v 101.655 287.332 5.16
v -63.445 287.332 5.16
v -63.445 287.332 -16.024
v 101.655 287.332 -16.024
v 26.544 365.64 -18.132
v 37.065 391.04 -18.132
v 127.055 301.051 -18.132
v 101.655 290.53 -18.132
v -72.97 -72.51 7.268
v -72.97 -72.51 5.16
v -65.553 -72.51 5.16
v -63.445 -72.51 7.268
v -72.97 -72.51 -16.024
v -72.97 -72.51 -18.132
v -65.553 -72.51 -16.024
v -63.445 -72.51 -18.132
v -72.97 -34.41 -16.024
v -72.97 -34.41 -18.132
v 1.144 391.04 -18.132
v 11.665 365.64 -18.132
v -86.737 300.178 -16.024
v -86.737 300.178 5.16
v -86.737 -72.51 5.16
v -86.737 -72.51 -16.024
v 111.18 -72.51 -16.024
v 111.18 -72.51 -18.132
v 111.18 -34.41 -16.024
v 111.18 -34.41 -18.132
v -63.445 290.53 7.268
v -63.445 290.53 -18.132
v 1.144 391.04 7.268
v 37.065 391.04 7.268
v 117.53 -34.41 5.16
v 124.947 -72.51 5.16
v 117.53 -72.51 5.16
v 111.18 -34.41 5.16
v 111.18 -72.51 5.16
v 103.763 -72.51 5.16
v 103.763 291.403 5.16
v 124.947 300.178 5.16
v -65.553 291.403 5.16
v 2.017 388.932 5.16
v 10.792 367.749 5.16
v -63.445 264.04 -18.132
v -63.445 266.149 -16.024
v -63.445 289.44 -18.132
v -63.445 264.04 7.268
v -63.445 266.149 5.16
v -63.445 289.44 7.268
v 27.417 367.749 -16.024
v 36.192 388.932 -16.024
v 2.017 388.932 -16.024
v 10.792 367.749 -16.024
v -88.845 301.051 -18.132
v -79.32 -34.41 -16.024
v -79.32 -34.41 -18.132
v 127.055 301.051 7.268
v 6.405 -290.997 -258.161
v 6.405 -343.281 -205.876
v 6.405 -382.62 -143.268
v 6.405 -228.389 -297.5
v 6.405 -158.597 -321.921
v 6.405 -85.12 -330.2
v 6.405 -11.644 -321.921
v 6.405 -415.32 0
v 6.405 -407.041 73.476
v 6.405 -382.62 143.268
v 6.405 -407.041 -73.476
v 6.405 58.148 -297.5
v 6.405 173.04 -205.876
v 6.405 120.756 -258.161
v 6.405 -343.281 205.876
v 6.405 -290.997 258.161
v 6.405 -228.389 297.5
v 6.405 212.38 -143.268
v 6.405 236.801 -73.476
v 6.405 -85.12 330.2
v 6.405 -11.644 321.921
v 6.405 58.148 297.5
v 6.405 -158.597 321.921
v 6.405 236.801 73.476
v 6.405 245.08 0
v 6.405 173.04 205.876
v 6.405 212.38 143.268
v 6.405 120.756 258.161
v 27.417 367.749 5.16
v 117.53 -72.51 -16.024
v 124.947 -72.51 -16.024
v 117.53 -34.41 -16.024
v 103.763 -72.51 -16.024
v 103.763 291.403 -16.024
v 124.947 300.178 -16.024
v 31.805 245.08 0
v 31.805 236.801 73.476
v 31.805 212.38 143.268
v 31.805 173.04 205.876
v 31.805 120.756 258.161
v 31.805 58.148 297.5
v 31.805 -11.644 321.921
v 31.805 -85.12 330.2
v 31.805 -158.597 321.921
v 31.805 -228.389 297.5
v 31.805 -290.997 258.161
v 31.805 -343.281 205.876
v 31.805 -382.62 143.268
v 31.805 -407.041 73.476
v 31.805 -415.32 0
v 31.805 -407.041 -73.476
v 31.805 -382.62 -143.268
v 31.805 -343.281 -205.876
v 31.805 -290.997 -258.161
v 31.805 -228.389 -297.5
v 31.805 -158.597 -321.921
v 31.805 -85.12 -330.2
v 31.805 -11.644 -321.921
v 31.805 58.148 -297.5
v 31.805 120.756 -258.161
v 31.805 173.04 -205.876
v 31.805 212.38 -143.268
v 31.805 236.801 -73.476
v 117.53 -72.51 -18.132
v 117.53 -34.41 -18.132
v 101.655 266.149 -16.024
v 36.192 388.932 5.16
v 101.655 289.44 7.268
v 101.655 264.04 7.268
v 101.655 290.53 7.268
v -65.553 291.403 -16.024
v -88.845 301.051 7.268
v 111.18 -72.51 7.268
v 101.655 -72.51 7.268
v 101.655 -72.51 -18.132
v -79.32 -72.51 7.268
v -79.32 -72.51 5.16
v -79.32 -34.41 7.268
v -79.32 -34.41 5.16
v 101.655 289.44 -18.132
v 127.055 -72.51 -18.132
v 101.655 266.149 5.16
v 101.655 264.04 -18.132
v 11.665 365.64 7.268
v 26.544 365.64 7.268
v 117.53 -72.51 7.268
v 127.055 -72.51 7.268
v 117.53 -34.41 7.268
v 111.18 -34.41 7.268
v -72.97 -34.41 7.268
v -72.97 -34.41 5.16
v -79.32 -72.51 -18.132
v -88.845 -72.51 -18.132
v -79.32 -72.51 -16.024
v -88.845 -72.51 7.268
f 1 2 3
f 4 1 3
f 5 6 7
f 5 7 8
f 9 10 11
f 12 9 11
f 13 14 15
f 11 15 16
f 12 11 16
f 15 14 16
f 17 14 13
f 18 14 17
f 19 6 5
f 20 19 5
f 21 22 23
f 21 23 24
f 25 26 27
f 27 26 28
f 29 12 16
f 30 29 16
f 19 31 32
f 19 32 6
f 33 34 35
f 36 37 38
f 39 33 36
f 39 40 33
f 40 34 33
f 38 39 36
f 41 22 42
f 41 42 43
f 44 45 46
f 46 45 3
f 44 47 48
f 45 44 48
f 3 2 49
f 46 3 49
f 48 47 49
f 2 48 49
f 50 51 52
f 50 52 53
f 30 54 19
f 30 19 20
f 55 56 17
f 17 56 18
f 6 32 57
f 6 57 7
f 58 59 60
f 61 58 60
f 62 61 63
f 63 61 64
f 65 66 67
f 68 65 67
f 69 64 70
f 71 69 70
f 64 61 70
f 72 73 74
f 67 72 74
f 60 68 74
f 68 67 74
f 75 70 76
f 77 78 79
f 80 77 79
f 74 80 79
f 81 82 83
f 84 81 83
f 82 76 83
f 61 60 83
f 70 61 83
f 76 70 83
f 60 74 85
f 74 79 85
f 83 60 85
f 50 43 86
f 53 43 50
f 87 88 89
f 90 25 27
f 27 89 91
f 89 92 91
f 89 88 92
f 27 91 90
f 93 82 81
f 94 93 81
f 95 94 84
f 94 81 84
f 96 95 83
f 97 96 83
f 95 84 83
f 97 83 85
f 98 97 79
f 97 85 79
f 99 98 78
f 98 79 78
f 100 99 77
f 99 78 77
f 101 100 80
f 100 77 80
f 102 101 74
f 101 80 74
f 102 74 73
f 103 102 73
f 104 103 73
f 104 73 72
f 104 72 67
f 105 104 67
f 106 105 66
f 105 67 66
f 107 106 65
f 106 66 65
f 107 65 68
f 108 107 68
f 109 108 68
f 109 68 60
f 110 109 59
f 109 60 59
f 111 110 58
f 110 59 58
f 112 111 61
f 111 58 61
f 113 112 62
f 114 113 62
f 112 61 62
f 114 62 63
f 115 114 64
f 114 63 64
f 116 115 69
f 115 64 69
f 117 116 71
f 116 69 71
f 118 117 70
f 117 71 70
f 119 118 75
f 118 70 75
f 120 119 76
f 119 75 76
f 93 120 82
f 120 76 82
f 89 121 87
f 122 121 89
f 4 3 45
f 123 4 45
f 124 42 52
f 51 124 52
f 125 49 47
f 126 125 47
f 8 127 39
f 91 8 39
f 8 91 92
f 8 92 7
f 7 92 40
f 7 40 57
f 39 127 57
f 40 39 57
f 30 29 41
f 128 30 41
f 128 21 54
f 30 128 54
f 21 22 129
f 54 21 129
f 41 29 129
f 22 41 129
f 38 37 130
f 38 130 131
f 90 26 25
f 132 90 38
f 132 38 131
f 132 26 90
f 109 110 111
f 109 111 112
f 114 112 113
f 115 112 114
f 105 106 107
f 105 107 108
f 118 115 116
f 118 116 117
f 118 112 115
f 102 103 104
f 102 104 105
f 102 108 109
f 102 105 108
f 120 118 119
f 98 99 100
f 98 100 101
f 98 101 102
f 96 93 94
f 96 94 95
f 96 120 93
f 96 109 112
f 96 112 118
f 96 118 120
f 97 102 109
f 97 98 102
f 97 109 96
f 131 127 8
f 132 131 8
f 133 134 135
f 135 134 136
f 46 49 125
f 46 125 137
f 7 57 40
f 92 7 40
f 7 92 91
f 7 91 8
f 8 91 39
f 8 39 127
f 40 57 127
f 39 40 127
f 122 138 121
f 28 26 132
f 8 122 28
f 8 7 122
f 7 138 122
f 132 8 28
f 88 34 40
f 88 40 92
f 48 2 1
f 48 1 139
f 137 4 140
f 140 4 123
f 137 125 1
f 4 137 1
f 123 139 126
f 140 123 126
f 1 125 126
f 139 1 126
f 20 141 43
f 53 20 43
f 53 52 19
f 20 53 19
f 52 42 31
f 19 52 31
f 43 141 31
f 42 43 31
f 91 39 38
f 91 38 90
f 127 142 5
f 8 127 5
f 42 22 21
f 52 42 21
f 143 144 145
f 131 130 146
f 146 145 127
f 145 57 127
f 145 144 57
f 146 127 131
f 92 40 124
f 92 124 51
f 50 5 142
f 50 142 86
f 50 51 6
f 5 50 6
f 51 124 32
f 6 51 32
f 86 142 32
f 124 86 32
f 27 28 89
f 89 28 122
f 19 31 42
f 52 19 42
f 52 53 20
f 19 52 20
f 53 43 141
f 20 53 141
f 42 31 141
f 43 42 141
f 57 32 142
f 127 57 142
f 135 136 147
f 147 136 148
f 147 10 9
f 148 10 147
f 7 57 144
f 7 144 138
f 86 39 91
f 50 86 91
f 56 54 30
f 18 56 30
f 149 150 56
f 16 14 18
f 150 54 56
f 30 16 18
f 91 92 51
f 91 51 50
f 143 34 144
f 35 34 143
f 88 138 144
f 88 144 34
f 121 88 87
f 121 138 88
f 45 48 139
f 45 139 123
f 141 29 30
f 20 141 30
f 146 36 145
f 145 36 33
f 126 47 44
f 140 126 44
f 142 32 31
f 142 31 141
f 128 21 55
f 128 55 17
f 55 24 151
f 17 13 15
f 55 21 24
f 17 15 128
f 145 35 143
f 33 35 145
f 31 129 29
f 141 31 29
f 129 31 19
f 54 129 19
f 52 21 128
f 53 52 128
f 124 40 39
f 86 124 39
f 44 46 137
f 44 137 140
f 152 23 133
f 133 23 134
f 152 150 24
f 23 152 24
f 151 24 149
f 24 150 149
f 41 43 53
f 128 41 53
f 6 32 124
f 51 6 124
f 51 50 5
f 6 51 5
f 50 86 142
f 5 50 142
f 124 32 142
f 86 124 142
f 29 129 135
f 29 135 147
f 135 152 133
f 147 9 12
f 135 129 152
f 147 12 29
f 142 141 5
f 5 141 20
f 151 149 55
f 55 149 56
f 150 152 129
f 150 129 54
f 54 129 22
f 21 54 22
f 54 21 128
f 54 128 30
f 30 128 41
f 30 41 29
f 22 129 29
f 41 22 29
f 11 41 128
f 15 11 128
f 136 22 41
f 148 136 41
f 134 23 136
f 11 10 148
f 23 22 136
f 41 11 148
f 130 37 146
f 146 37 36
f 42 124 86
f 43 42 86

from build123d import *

# Parameters (mm, degrees)
WHEEL_START                                    = 6.404710745
WHEEL_OUTLINE_R                                = 330.2
WHEEL_DEPTH                                    = 25.4
SKETCH11_W                                     = 25.4
SKETCH11_H                                     = 25.4
SKETCH11_W_2                                   = 21.1836
SKETCH11_H_2                                   = 21.1836
AL_TUBE_SQUARE_AL_TUBE_1_SQR_X_0_083_WAL_DEPTH = 376.739487758
SKETCH11_ON_SEGMENT_2_W                        = 25.4
SKETCH11_ON_SEGMENT_2_H                        = 25.4
SKETCH11_ON_SEGMENT_2_W_2                      = 21.1836
SKETCH11_ON_SEGMENT_2_H_2                      = 21.1836
AL_TUBE_SQUARE_AL_TUBE_1_SQR_X_0_083_3_DEPTH   = 133.622305091
SKETCH11_ON_SEGMENT_3_W                        = 25.4
SKETCH11_ON_SEGMENT_3_H                        = 25.4
SKETCH11_ON_SEGMENT_3_W_2                      = 21.1836
SKETCH11_ON_SEGMENT_3_H_2                      = 21.1836
AL_TUBE_SQUARE_AL_TUBE_1_SQR_X_0_083_5_DEPTH   = 42.278975516
SKETCH11_ON_SEGMENT_4_W                        = 25.4
SKETCH11_ON_SEGMENT_4_H                        = 25.4
SKETCH11_ON_SEGMENT_4_W_2                      = 21.1836
SKETCH11_ON_SEGMENT_4_H_2                      = 21.1836
AL_TUBE_SQUARE_AL_TUBE_1_SQR_X_0_083_7_DEPTH   = 133.622305091
SKETCH11_ON_SEGMENT_5_W                        = 25.4
SKETCH11_ON_SEGMENT_5_H                        = 25.4
SKETCH11_ON_SEGMENT_5_W_2                      = 21.1836
SKETCH11_ON_SEGMENT_5_H_2                      = 21.1836
AL_TUBE_SQUARE_AL_TUBE_1_SQR_X_0_083_9_DEPTH   = 376.739487758
SKETCH11_ON_SEGMENT_6_W                        = 25.4
SKETCH11_ON_SEGMENT_6_H                        = 25.4
SKETCH11_ON_SEGMENT_6_W_2                      = 21.1836
SKETCH11_ON_SEGMENT_6_H_2                      = 21.1836
AL_TUBE_SQUARE_AL_TUBE_1_SQR_X_0_083_10_DEPTH  = 192.500000002
CUT_EXTRUDE1_DEPTH                             = 551.016675996
CUT_EXTRUDE1_DEPTH_BACK                        = 551.016675996
SKETCH16_W                                     = 6.35
SKETCH16_H                                     = 38.1


# Read off the part's stored shape, not the designer's step: wheel
with BuildPart() as part:
    # wheel outline → wheel (new body)
    with BuildSketch(Plane.YZ.offset(WHEEL_START)):
        with Locations((-85.120268568, 0)):
            Circle(WHEEL_OUTLINE_R)
    extrude(amount=WHEEL_DEPTH)


with BuildPart() as body_2:
    # Sketch11 → Al tube square AL TUBE 1 SQR X 0.083 WALL(1) (new body)
    with BuildSketch(Plane(origin=(-76.145289254, -72.509659064, -5.432195809), x_dir=(1, 0, 0), z_dir=(0, 1, 0))):
        Rectangle(SKETCH11_W, SKETCH11_H)
        Rectangle(SKETCH11_W_2, SKETCH11_H_2, mode=Mode.SUBTRACT)
    extrude(amount=AL_TUBE_SQUARE_AL_TUBE_1_SQR_X_0_083_WAL_DEPTH)

    # Al tube square AL TUBE 1 SQR X 0.083 2
    split(bisect_by=Plane(origin=(-76.145289254, 295.790340936, -5.432195809), x_dir=(0.923879533, -0.382683432, 0), z_dir=(-0.382683432, -0.923879533, 0)), keep=Keep.TOP)


with BuildPart() as body_3:
    # Sketch11 on segment 2 (carried to segment 2) → Al tube square AL TUBE 1 SQR X 0.083 3 (new body)
    with BuildSketch(Plane(origin=(-82.112908278, 289.822721913, -5.432195809), x_dir=(0.707106781, -0.707106781, 0), z_dir=(0.707106781, 0.707106781, 0))):
        Rectangle(SKETCH11_ON_SEGMENT_2_W, SKETCH11_ON_SEGMENT_2_H)
        Rectangle(SKETCH11_ON_SEGMENT_2_W_2, SKETCH11_ON_SEGMENT_2_H_2, mode=Mode.SUBTRACT)
    extrude(amount=AL_TUBE_SQUARE_AL_TUBE_1_SQR_X_0_083_3_DEPTH)

    # Al tube square AL TUBE 1 SQR X 0.083 3 m
    split(bisect_by=Plane(origin=(-76.145289254, 295.790340936, -5.432195809), x_dir=(-0.923879533, 0.382683432, 0), z_dir=(0.382683432, 0.923879533, 0)), keep=Keep.TOP)

    # Al tube square AL TUBE 1 SQR X 0.083 4
    split(bisect_by=Plane(origin=(6.404710747, 378.340340937, -5.432195809), x_dir=(0.382683432, -0.923879533, 0), z_dir=(-0.923879533, -0.382683432, 0)), keep=Keep.TOP)


with BuildPart() as body_4:
    # Sketch11 on segment 3 (carried to segment 3) → Al tube square AL TUBE 1 SQR X 0.083 5 (new body)
    with BuildSketch(Plane(origin=(-2.034777011, 378.340340937, -5.432195809), x_dir=(0, -1, 0), z_dir=(1, 0, 0))):
        Rectangle(SKETCH11_ON_SEGMENT_3_W, SKETCH11_ON_SEGMENT_3_H)
        Rectangle(SKETCH11_ON_SEGMENT_3_W_2, SKETCH11_ON_SEGMENT_3_H_2, mode=Mode.SUBTRACT)
    extrude(amount=AL_TUBE_SQUARE_AL_TUBE_1_SQR_X_0_083_5_DEPTH)

    # Al tube square AL TUBE 1 SQR X 0.083 5 m
    split(bisect_by=Plane(origin=(31.804710747, 378.340340937, -5.432195809), x_dir=(-0.382683432, -0.923879533, 0), z_dir=(-0.923879533, 0.382683432, 0)), keep=Keep.TOP)

    # Al tube square AL TUBE 1 SQR X 0.083 6
    split(bisect_by=Plane(origin=(6.404710747, 378.340340937, -5.432195809), x_dir=(-0.382683432, 0.923879533, 0), z_dir=(0.923879533, 0.382683432, 0)), keep=Keep.TOP)


with BuildPart() as body_5:
    # Sketch11 on segment 4 (carried to segment 4) → Al tube square AL TUBE 1 SQR X 0.083 7 (new body)
    with BuildSketch(Plane(origin=(25.837091724, 384.30795996, -5.432195809), x_dir=(-0.707106781, -0.707106781, 0), z_dir=(0.707106781, -0.707106781, 0))):
        Rectangle(SKETCH11_ON_SEGMENT_4_W, SKETCH11_ON_SEGMENT_4_H)
        Rectangle(SKETCH11_ON_SEGMENT_4_W_2, SKETCH11_ON_SEGMENT_4_H_2, mode=Mode.SUBTRACT)
    extrude(amount=AL_TUBE_SQUARE_AL_TUBE_1_SQR_X_0_083_7_DEPTH)

    # Al tube square AL TUBE 1 SQR X 0.083 7 m
    split(bisect_by=Plane(origin=(31.804710747, 378.340340937, -5.432195809), x_dir=(0.382683432, 0.923879533, 0), z_dir=(0.923879533, -0.382683432, 0)), keep=Keep.TOP)

    # Al tube square AL TUBE 1 SQR X 0.083 8
    split(bisect_by=Plane(origin=(114.354710748, 295.790340936, -5.432195809), x_dir=(-0.923879533, -0.382683432, 0), z_dir=(-0.382683432, 0.923879533, 0)), keep=Keep.TOP)


with BuildPart() as body_6:
    # Sketch11 on segment 5 (carried to segment 5) → Al tube square AL TUBE 1 SQR X 0.083 9 (new body)
    with BuildSketch(Plane(origin=(114.354710748, 304.229828694, -5.432195809), x_dir=(-1, 0, 0), z_dir=(0, -1, 0))):
        Rectangle(SKETCH11_ON_SEGMENT_5_W, SKETCH11_ON_SEGMENT_5_H)
        Rectangle(SKETCH11_ON_SEGMENT_5_W_2, SKETCH11_ON_SEGMENT_5_H_2, mode=Mode.SUBTRACT)
    extrude(amount=AL_TUBE_SQUARE_AL_TUBE_1_SQR_X_0_083_9_DEPTH)

    # Al tube square AL TUBE 1 SQR X 0.083 9 m
    split(bisect_by=Plane(origin=(114.354710748, 295.790340936, -5.432195809), x_dir=(0.923879533, 0.382683432, 0), z_dir=(0.382683432, -0.923879533, 0)), keep=Keep.TOP)


with BuildPart() as body_7:
    # Sketch11 on segment 6 (carried to segment 6) → Al tube square AL TUBE 1 SQR X 0.083 10 (new body)
    with BuildSketch(Plane(origin=(-77.145289254, 276.740340936, -5.432195809), x_dir=(0, -1, 0), z_dir=(1, 0, 0))):
        Rectangle(SKETCH11_ON_SEGMENT_6_W, SKETCH11_ON_SEGMENT_6_H)
        Rectangle(SKETCH11_ON_SEGMENT_6_W_2, SKETCH11_ON_SEGMENT_6_H_2, mode=Mode.SUBTRACT)
    extrude(amount=AL_TUBE_SQUARE_AL_TUBE_1_SQR_X_0_083_10_DEPTH)

    # Al tube square AL TUBE 1 SQR X 0.083 11
    split(bisect_by=Plane(origin=(-63.445289254, 276.740340936, -5.432195809), x_dir=(0, 1, 0), z_dir=(1, 0, 0)), keep=Keep.TOP)

    # Al tube square AL TUBE 1 SQR X 0.083 12
    split(bisect_by=Plane(origin=(101.654710748, 276.740340936, -5.432195809), x_dir=(0, -1, 0), z_dir=(-1, 0, 0)), keep=Keep.TOP)


with BuildPart() as cut_extrude1_tool:
    # Sketch16 → Cut-Extrude1 (new, two sides: drawn at the far end of the back side and taken through both)
    with BuildSketch(Plane.XY.offset(7.267804191).offset(-CUT_EXTRUDE1_DEPTH_BACK)):
        with Locations((-76.145289254, -53.459659064)):
            Rectangle(SKETCH16_W, SKETCH16_H)
        with Locations((114.354710748, -53.459659064)):
            Rectangle(SKETCH16_W, SKETCH16_H)
    extrude(amount=CUT_EXTRUDE1_DEPTH + CUT_EXTRUDE1_DEPTH_BACK)


with BuildPart() as body_2_1:
    add(body_2.part)

    # Cut-Extrude1: cut by cut_extrude1_tool
    add(cut_extrude1_tool.part, mode=Mode.SUBTRACT)


with BuildPart() as body_6_1:
    add(body_6.part)

    # Cut-Extrude1: cut by cut_extrude1_tool
    add(cut_extrude1_tool.part, mode=Mode.SUBTRACT)


solid = Compound([part.part, body_3.part, body_4.part, body_5.part, body_7.part, body_2_1.part, body_6_1.part])
